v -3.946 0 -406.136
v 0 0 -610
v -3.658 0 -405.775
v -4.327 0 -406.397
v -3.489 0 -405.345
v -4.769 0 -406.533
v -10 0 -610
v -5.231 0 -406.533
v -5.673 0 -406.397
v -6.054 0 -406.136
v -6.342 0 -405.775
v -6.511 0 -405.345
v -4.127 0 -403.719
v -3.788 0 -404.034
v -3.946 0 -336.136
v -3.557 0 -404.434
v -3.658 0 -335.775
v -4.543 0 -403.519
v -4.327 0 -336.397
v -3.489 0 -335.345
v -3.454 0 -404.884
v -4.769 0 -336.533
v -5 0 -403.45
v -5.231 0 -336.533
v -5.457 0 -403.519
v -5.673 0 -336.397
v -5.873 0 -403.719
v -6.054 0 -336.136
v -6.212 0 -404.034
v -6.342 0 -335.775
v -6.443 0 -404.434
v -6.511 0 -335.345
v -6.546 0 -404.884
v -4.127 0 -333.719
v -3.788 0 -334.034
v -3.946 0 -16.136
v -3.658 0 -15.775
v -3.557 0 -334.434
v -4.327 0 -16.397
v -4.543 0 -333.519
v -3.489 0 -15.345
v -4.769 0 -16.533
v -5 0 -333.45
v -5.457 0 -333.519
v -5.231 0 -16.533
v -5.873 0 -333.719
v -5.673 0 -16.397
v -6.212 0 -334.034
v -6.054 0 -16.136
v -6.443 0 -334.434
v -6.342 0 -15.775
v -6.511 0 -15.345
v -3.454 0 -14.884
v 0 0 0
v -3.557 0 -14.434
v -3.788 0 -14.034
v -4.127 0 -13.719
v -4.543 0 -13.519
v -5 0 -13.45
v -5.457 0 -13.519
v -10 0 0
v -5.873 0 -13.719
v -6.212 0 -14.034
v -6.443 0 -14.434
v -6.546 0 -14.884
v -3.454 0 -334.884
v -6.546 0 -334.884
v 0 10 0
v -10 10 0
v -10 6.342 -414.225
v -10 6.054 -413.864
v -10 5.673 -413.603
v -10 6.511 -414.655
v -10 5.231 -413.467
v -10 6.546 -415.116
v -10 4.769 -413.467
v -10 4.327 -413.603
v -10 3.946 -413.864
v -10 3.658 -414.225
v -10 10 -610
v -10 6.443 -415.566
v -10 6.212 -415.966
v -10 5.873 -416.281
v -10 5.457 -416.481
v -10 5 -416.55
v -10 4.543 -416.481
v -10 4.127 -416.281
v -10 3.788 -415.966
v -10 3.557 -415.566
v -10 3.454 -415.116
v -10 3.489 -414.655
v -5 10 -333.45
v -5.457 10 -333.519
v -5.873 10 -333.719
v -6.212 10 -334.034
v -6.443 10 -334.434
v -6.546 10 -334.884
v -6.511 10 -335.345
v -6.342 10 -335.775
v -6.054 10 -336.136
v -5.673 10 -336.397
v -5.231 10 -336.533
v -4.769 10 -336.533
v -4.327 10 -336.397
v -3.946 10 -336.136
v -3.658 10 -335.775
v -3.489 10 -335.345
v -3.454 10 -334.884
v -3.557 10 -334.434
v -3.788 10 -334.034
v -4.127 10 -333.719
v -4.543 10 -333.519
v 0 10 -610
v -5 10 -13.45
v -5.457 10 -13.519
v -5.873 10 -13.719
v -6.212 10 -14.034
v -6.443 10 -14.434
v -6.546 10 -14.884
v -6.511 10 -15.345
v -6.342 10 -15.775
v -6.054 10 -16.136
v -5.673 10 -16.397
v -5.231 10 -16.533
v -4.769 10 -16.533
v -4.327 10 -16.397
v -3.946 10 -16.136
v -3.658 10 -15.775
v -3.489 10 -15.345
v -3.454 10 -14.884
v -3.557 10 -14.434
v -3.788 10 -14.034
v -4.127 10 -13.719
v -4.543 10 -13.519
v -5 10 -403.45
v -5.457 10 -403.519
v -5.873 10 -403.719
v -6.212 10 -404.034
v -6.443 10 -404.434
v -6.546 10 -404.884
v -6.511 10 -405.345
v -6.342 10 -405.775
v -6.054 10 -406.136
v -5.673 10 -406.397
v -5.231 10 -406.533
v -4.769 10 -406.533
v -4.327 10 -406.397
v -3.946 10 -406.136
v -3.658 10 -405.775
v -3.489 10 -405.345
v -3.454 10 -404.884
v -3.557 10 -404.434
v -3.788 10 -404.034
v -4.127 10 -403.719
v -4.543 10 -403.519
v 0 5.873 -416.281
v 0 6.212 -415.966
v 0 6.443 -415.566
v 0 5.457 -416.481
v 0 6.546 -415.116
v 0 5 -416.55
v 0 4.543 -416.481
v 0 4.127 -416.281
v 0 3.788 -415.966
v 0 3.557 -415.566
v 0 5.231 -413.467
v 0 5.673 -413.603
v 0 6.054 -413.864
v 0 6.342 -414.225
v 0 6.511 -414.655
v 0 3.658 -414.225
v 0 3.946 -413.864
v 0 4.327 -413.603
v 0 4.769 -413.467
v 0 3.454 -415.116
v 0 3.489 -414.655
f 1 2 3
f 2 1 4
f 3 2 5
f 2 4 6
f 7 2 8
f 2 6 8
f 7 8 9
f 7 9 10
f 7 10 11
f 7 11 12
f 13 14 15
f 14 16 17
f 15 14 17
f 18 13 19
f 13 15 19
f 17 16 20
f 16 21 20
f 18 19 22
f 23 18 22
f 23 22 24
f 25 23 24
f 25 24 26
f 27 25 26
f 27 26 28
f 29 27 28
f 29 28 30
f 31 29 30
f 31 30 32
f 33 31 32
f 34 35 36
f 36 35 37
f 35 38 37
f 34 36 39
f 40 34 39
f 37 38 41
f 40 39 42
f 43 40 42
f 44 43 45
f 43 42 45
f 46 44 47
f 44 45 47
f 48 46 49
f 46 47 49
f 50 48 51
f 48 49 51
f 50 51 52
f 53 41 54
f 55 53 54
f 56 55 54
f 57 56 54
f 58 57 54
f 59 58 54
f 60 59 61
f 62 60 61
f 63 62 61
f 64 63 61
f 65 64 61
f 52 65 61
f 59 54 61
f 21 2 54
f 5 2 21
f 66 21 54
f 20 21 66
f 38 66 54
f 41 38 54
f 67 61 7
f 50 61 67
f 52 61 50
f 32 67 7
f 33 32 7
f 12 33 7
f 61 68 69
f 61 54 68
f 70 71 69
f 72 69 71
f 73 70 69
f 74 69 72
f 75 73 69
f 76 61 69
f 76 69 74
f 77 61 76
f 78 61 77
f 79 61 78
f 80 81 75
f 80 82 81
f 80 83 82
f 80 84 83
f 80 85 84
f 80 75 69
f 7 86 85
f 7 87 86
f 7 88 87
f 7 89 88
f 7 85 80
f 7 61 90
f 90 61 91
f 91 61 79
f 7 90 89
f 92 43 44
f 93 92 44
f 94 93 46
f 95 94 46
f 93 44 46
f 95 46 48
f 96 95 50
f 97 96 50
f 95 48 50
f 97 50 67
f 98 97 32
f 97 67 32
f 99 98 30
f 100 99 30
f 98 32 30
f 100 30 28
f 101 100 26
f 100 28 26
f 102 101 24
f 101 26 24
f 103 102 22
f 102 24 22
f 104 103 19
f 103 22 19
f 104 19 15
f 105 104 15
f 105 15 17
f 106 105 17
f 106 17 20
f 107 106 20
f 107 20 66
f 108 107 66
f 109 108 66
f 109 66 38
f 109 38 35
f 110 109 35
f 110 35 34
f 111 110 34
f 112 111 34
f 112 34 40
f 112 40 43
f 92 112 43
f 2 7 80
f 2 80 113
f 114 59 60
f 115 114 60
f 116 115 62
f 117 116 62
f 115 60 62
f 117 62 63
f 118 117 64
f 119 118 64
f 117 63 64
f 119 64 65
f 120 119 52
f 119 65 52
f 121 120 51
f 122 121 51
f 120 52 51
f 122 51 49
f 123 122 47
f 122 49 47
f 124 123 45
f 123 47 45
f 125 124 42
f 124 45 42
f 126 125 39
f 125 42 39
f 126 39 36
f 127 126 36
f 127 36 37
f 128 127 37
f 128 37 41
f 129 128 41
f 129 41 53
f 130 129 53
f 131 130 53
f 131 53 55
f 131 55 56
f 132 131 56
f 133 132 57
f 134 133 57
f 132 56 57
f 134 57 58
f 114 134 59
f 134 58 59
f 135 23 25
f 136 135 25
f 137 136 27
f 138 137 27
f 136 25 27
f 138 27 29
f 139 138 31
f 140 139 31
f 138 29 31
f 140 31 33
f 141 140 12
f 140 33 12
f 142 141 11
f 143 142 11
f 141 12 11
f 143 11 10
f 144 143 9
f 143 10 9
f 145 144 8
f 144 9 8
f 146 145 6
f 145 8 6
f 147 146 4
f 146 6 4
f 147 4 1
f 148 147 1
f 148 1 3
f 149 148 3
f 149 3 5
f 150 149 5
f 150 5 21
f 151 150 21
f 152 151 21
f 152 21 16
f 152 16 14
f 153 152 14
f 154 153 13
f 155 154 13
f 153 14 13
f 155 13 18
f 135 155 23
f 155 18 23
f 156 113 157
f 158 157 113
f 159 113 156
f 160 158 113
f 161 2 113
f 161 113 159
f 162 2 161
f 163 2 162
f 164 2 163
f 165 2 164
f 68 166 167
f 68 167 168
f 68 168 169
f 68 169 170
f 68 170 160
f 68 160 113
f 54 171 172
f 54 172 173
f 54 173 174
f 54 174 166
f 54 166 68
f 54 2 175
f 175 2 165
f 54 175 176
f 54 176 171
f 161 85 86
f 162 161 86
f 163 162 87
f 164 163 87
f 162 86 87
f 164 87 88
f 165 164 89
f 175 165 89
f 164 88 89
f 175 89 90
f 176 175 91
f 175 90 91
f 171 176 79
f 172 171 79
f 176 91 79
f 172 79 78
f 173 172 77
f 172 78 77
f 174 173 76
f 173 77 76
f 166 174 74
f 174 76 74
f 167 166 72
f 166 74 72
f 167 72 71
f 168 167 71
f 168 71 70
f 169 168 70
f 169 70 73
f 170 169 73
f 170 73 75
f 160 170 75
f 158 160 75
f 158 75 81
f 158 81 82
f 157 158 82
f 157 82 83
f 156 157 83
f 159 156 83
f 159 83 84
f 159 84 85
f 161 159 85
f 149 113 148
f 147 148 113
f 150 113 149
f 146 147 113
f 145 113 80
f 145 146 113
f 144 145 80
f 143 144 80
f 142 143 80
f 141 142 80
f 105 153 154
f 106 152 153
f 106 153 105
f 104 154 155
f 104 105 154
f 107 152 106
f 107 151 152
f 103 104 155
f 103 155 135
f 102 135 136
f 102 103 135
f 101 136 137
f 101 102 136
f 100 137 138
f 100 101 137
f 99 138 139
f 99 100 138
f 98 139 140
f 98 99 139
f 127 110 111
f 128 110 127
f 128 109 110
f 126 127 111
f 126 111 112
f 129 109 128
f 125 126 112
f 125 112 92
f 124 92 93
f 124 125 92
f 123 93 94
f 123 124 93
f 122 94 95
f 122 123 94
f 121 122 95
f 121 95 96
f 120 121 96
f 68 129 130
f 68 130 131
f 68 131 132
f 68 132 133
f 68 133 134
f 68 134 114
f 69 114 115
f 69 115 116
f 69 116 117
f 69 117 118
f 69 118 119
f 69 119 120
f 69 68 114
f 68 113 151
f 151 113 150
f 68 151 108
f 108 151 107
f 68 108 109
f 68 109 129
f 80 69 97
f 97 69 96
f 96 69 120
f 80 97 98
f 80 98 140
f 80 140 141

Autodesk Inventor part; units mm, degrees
ref_plane "YZ Plane" through (0, 0, 0) normal (1, 0, 0) x (0, 1, 0)
ref_plane "XZ Plane" through (0, 0, 0) normal (0, 1, 0) x (-1, 0, 0)
ref_plane "XY Plane" through (0, 0, 0) normal (0, 0, 1) x (1, 0, 0)
sketch "スケッチ1" plane through (0, 0, 0) normal (0, 1, 0) x (-1, 0, 0)
  line L0 (0, 0) -> (10, 0)
  line L1 (10, 0) -> (10, -610)
  line L2 (10, -610) -> (0, -610)
  line L3 (0, -610) -> (0, 0)
  dimension "d0" = 10
  dimension "d1" = 610
extrude "押し出し1" add sketch "スケッチ1" along normal blind 10
sketch "スケッチ2" plane through (0, 10, 0) normal (0, 1, 0) x (1, 0, 0)
  line L0 (-10, 0) -> (0, 0) projected
  point P0 (-5, 405)
  point P1 (-5, 0)
  point P2 (-5, 0)
  dimension "d4" = 405
hole "穴1" at (-5, 10, -405) direction (0, -1, 0) diameter 3.1 end through all
sketch "スケッチ3" plane through (0, 0, 0) normal (1, 0, 0) x (0, 0, -1)
  line L0 (0, 0) -> (0, 10) projected
  point P0 (415, 5)
  point P1 (0, 5)
  point P2 (0, 5)
  dimension "d12" = 415
hole "穴2" at (0, 5, -415) direction (-1, 0, 0) diameter 3.1 end through all
sketch "スケッチ4" plane through (0, 10, 0) normal (0, 1, 0) x (1, 0, 0)
  line L0 (-10, 0) -> (0, 0) projected
  point P0 (-5, 15)
  point P1 (-5, 335)
  point P2 (-5, 0)
  point P3 (-5, 0)
  point P4 (-5, 0)
  point P5 (-5, 0)
  dimension "d20" = 15
  dimension "d21" = 335
hole "穴3" at (-5, 10, -15) at (-5, 10, -335) direction (0, -1, 0) diameter 3.1 end through all
properties part number "Dai"
